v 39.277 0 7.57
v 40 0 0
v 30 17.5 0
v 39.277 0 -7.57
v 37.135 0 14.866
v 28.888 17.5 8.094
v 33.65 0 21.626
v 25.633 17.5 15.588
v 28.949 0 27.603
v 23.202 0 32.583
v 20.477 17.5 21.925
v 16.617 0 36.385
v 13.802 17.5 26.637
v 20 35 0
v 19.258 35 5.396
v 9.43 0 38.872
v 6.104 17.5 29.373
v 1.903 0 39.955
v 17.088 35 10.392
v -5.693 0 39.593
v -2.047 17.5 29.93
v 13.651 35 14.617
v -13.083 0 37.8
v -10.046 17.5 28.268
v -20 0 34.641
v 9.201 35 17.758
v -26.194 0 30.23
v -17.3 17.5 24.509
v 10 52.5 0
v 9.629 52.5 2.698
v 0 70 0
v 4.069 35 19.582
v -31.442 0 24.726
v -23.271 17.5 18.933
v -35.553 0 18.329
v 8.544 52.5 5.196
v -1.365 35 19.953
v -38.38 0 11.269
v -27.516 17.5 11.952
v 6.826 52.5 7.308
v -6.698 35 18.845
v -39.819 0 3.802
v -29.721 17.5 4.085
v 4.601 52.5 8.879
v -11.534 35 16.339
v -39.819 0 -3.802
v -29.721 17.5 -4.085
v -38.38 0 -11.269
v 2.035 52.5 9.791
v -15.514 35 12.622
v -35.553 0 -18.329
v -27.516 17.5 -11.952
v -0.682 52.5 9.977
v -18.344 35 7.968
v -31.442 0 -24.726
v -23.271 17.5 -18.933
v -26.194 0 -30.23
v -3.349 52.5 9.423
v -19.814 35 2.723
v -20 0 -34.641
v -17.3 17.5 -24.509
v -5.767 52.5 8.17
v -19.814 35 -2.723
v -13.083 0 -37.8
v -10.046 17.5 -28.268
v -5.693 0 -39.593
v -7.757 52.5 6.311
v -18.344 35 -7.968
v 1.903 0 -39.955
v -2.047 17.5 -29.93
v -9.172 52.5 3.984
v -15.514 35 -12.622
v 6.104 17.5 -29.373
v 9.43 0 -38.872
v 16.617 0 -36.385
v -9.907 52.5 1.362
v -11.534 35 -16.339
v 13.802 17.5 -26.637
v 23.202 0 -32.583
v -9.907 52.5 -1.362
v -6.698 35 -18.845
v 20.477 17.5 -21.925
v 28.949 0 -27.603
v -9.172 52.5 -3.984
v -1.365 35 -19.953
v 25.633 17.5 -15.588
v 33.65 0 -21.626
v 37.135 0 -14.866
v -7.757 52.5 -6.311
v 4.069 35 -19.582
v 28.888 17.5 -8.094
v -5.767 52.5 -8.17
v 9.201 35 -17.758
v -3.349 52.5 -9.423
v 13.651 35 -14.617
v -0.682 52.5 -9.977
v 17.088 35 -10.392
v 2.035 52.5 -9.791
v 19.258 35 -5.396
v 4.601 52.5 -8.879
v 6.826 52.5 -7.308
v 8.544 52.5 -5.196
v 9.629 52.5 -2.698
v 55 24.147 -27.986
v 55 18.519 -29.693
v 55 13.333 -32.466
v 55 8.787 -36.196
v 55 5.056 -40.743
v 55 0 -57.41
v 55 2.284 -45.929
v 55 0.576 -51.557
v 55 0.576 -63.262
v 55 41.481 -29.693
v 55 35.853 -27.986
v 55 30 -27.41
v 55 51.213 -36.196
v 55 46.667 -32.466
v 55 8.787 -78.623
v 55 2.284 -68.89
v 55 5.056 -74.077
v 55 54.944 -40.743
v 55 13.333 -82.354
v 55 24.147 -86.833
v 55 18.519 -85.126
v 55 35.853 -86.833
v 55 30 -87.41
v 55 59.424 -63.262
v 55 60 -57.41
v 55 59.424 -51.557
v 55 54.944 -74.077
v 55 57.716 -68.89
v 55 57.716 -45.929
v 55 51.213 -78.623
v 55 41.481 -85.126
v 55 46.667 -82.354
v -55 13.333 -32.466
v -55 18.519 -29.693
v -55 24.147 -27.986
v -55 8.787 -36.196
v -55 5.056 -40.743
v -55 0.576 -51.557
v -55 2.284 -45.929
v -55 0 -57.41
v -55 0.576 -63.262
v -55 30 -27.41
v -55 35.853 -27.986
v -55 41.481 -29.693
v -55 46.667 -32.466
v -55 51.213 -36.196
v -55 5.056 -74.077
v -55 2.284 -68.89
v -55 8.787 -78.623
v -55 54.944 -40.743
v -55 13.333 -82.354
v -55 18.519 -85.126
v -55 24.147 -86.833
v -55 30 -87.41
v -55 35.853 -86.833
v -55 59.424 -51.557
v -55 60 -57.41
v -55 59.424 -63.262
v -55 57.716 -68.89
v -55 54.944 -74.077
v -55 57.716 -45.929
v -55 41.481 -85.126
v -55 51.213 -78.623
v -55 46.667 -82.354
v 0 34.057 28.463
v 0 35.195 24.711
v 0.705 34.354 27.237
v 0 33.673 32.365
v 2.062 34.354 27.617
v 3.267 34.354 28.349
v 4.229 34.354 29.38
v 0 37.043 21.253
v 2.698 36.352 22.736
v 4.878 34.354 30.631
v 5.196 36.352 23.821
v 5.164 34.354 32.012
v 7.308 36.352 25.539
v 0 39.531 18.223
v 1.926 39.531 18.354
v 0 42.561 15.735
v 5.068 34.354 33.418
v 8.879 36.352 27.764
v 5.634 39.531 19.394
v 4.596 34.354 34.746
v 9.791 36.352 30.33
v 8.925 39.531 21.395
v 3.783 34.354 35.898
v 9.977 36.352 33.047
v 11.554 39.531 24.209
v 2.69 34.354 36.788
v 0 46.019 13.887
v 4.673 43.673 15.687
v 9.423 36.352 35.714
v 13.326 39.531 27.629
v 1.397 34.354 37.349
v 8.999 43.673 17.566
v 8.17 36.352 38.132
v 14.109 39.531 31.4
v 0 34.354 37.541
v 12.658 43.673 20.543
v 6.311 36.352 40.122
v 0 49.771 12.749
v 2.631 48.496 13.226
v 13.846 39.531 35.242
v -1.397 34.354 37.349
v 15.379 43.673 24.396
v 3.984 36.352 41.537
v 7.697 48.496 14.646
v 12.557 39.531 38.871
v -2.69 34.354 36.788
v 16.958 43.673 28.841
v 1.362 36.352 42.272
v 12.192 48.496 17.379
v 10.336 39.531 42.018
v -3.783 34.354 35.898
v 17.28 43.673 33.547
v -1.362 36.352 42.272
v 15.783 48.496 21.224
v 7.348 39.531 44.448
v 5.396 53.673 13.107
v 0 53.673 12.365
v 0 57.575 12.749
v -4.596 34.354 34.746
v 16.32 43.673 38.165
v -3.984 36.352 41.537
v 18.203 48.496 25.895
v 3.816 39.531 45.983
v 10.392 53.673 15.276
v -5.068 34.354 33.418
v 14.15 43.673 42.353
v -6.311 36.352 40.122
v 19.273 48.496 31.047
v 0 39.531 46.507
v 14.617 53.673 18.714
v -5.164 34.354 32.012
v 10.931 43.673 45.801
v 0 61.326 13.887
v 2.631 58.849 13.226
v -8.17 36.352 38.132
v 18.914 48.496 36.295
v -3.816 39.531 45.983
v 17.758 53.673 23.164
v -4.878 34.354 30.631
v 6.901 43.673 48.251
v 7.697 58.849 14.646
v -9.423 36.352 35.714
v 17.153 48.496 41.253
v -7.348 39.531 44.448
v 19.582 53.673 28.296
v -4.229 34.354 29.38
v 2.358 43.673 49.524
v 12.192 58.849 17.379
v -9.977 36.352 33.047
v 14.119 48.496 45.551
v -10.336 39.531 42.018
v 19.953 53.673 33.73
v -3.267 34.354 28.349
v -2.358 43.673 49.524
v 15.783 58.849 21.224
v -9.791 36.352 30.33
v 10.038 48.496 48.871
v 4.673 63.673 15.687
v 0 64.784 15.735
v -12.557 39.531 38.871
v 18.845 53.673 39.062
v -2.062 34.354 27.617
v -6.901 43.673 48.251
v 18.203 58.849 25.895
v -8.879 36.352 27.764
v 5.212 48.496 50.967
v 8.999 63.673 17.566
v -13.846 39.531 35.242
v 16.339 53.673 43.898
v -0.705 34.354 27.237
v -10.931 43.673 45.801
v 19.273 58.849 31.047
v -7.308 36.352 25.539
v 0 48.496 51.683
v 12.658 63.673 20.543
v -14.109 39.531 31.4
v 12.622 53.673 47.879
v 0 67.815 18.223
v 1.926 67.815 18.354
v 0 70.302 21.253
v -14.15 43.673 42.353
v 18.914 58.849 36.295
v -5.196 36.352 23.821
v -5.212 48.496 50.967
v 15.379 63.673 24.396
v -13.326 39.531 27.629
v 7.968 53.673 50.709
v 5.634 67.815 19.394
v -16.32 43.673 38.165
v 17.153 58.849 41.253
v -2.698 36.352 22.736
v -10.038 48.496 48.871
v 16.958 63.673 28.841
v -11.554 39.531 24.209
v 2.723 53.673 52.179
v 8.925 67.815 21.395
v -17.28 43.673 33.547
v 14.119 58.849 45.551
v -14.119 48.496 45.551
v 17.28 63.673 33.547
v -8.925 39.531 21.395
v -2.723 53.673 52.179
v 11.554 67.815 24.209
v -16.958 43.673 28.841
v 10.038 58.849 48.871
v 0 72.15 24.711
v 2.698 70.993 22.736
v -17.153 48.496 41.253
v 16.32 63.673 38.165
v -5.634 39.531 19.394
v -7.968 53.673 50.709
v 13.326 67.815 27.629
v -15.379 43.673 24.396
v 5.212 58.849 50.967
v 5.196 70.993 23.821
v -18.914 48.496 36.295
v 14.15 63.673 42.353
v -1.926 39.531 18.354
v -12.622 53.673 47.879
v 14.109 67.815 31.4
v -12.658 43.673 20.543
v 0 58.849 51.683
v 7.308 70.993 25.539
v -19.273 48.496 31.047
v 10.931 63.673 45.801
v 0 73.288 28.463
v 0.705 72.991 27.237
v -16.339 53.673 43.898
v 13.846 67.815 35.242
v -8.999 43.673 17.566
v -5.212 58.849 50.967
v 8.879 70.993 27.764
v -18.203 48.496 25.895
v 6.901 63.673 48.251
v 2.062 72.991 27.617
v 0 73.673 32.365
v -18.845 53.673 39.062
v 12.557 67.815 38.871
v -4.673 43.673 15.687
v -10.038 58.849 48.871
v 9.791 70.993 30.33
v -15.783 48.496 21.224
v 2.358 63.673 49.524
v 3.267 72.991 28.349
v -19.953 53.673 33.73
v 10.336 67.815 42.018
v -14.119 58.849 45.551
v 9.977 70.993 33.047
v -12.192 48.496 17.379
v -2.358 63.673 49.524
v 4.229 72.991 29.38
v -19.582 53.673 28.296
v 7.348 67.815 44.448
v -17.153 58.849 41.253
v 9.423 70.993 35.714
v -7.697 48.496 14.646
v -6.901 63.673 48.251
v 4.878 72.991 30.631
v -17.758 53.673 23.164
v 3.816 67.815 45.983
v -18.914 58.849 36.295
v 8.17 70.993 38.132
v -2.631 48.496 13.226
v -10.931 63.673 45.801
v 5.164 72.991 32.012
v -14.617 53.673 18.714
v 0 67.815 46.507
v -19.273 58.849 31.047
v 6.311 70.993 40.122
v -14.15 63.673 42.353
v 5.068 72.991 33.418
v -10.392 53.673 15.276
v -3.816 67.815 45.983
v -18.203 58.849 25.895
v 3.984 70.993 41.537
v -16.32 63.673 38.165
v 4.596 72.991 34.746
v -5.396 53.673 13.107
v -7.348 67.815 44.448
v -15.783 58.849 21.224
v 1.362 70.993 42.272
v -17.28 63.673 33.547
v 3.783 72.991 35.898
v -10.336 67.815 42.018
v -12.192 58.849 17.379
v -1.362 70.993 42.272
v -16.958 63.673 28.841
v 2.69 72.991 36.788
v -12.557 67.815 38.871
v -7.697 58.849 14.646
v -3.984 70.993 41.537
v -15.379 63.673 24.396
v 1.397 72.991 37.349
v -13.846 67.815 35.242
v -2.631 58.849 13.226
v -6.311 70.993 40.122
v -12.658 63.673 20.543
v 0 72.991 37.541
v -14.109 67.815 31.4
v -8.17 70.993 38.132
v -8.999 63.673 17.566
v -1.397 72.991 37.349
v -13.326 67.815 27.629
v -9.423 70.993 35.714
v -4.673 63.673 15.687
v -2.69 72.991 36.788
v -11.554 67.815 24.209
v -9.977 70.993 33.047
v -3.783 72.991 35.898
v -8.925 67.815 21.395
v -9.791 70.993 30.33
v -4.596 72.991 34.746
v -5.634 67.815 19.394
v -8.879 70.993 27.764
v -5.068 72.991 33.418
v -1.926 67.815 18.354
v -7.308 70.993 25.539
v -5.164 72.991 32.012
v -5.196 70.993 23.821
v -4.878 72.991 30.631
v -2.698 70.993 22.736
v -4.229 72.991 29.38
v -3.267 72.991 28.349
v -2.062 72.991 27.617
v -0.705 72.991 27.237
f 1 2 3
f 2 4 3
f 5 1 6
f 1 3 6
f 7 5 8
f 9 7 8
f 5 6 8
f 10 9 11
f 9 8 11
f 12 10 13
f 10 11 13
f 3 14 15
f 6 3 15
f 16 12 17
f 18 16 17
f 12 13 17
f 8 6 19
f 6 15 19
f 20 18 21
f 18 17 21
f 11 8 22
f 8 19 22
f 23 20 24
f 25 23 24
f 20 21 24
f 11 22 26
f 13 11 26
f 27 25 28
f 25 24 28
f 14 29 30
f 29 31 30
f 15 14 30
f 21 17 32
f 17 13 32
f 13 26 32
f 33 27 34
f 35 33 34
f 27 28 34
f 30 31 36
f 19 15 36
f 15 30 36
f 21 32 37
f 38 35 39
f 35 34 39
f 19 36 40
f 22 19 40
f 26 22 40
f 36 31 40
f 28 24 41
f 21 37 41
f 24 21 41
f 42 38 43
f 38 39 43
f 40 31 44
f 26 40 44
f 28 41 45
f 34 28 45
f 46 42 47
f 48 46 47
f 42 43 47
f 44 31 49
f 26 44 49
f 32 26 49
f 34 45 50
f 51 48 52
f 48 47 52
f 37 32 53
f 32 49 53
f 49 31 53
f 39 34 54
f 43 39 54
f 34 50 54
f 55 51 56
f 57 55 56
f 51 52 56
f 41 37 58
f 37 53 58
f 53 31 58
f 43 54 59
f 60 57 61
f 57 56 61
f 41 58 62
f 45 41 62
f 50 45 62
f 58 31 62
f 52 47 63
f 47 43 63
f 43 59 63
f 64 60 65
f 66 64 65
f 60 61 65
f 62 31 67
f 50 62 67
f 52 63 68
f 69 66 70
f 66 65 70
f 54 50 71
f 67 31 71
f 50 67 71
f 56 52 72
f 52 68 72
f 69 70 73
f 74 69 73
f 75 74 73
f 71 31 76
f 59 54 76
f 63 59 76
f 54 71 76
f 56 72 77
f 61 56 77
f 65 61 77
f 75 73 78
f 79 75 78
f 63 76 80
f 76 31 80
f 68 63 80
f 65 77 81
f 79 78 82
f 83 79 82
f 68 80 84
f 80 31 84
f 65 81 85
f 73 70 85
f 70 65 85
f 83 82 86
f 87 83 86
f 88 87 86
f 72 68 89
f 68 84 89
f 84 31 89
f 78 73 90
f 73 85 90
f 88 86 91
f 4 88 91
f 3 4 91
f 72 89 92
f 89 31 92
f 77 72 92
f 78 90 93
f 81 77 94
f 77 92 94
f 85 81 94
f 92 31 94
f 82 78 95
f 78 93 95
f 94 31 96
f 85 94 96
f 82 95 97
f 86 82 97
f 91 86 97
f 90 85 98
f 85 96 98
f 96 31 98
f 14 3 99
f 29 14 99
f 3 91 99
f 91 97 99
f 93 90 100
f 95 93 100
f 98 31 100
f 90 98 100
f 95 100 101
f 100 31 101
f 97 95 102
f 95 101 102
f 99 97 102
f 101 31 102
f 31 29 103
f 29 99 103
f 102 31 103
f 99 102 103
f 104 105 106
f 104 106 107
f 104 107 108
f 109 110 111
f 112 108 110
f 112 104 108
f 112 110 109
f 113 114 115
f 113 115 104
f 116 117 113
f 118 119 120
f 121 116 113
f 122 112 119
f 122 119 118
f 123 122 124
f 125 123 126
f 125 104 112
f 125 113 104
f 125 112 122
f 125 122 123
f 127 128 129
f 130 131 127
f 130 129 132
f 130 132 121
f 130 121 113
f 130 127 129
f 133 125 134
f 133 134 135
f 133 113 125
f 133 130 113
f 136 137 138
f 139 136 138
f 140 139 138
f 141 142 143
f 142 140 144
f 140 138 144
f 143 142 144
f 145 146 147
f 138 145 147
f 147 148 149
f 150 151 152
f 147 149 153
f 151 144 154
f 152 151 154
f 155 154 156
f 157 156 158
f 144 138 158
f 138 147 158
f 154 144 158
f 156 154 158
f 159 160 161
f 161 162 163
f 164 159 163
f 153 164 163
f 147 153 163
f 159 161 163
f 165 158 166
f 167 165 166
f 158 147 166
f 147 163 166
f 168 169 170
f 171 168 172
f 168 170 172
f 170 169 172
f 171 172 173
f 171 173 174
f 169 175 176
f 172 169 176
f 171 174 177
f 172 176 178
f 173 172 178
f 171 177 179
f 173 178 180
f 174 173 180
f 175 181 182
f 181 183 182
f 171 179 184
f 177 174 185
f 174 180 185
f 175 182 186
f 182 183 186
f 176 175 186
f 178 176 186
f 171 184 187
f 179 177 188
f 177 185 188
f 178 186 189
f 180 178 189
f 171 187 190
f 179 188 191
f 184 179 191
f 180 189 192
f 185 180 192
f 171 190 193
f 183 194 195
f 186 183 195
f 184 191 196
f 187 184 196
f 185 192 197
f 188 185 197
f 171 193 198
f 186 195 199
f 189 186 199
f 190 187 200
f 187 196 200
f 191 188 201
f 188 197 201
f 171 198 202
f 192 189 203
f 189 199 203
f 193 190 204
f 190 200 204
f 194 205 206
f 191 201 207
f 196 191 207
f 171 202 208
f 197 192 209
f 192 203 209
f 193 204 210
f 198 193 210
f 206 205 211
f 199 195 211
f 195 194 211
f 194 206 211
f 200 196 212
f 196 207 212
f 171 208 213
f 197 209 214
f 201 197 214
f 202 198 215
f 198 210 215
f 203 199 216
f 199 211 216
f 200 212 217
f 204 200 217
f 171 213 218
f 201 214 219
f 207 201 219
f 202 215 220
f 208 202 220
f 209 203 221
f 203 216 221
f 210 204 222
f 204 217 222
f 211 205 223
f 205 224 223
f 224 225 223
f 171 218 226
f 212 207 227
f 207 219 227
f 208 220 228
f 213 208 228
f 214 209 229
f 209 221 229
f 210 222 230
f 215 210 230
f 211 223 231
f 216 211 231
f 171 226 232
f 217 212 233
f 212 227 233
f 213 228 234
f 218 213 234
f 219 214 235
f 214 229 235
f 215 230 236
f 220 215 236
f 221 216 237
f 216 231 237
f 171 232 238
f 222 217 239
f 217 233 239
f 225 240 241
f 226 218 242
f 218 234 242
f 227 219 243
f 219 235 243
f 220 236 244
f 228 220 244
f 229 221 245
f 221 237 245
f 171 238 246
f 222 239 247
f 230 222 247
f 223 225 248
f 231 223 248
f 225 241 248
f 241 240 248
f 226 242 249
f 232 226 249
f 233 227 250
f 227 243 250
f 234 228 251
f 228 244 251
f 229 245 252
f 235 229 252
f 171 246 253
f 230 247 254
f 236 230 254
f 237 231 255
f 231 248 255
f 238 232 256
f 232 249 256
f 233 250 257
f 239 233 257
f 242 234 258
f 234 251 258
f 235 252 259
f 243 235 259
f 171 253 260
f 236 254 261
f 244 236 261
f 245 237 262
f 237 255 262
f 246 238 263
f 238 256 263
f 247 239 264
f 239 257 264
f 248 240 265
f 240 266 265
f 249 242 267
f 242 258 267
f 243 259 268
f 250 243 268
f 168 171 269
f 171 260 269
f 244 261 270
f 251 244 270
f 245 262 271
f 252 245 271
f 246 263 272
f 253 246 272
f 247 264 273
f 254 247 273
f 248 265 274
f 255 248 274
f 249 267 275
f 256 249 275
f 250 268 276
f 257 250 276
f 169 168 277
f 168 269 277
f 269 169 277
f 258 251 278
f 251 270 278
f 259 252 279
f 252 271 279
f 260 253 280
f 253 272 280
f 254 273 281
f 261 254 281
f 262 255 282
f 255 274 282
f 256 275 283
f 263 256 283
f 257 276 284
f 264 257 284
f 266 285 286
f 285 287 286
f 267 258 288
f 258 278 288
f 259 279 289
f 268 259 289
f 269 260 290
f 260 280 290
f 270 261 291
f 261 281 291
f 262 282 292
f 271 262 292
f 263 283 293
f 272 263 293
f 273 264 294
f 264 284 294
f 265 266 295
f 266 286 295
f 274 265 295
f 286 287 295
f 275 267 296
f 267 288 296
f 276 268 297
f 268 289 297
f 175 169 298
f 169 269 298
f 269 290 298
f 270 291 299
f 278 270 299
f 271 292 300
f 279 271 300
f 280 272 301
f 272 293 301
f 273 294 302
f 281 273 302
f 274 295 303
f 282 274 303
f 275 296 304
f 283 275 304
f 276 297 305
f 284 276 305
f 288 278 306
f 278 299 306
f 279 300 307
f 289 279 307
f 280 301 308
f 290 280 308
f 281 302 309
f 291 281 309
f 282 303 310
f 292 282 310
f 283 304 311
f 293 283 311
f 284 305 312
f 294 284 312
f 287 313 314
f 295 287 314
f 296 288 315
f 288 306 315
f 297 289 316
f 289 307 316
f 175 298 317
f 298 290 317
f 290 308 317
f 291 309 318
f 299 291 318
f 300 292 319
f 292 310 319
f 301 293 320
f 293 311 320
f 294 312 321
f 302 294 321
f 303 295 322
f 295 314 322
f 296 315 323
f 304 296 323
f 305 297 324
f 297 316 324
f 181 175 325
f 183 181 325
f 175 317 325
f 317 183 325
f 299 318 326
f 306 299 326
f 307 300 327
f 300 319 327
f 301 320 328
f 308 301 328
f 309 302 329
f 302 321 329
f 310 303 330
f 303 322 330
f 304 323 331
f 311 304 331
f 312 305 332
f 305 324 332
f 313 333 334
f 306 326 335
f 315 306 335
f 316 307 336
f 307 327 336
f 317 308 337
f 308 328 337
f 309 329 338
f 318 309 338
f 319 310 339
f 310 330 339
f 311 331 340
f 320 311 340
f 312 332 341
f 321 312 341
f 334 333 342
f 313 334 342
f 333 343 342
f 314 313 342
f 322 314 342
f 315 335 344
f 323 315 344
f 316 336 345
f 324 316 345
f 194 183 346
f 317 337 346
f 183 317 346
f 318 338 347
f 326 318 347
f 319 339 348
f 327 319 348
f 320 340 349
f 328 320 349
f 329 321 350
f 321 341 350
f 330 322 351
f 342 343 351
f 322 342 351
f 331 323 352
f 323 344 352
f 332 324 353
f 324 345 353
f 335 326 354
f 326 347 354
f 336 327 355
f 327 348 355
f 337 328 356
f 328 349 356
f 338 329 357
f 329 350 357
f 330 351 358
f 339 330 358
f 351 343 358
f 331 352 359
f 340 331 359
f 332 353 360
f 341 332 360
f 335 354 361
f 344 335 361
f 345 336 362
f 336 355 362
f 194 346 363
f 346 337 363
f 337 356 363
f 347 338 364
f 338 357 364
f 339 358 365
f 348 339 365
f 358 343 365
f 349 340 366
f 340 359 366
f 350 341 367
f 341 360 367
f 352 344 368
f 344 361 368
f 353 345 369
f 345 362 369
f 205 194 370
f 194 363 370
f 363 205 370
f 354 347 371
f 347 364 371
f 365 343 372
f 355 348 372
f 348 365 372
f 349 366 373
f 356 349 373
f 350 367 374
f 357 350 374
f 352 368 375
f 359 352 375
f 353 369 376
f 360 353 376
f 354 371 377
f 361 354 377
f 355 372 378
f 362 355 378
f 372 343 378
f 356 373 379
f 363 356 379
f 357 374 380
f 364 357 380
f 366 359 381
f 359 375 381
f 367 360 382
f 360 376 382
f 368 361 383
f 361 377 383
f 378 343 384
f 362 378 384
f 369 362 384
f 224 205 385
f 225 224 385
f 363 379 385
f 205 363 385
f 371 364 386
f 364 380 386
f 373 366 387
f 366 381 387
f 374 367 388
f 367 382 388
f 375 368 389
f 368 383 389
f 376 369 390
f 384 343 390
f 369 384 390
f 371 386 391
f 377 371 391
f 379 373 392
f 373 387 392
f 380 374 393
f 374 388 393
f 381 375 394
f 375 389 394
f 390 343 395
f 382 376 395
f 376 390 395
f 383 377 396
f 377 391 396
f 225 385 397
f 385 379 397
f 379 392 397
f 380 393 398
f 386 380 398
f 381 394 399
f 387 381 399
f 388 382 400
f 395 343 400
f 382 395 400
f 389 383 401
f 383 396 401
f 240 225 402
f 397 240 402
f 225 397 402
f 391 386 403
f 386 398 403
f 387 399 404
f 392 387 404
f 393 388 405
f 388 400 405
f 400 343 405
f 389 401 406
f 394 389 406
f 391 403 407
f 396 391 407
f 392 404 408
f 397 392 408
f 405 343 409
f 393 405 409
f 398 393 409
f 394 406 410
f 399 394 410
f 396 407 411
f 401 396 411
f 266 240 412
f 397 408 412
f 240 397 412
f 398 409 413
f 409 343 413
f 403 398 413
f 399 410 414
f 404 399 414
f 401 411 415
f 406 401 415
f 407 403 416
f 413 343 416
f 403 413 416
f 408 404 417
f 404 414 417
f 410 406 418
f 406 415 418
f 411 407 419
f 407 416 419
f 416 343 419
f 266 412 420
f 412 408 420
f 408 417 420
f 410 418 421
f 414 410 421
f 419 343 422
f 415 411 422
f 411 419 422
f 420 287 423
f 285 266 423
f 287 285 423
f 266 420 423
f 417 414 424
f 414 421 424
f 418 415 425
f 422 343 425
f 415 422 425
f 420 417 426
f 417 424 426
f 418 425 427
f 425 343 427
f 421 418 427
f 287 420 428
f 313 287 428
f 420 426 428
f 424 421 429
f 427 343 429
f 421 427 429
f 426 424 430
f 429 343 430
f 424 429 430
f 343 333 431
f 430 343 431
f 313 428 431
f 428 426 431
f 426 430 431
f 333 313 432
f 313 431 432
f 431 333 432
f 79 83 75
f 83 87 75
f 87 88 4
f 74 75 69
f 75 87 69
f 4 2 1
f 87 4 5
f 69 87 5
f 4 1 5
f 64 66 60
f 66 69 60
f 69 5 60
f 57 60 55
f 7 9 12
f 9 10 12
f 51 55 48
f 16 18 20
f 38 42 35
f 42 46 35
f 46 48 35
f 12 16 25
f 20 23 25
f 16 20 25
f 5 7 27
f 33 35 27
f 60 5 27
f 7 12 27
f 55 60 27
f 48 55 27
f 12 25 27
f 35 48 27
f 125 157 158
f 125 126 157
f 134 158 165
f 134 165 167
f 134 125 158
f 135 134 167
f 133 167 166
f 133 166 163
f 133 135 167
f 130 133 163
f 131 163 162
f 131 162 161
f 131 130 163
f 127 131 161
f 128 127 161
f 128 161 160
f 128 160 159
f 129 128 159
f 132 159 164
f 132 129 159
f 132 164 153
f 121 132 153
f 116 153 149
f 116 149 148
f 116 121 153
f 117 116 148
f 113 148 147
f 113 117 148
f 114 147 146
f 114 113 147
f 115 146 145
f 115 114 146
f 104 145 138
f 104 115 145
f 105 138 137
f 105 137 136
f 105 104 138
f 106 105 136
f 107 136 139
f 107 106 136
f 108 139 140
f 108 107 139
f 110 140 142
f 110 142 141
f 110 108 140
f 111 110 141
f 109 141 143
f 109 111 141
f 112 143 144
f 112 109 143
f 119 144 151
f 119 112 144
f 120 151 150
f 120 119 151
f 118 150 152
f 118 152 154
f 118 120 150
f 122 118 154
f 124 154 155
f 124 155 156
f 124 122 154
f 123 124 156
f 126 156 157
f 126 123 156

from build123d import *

# Parameters (mm, degrees)
SKETCH2_R      = 30
EXTRUDE1_DEPTH = 55


with BuildPart() as part:
    # Sketch1 → Revolve1 (revolve)
    with BuildSketch(Plane.XY):
        Polygon((0, 0), (40, 0), (0, 70), align=None)
    revolve(axis=Axis((0, 70, 0), (0, -1, 0)))


with BuildPart() as body_2:
    # Sketch2 → Extrude1 (new body, symmetric)
    with BuildSketch(Plane(origin=(0, 0, 0), x_dir=(0, 0, -1), z_dir=(1, 0, 0))):
        with Locations((57.409676064, 30)):
            Circle(SKETCH2_R)
    extrude(amount=EXTRUDE1_DEPTH, both=True)


with BuildPart() as body_3:
    # Sketch3 → Revolve2 (revolve)
    with BuildSketch(Plane(origin=(0, 0, 0), x_dir=(0, 0, -1), z_dir=(1, 0, 0))):
        with BuildLine():
            Line((-32.364862842, 73.672778767), (-32.364862842, 33.672778767))
            ThreePointArc((-32.364862842, 33.672778767), (-12.364862842, 53.672778767), (-32.364862842, 73.672778767))
        make_face()
    revolve(axis=Axis((0, 73.672778767, 32.364862842), (0, -1, 0)))


solid = Compound([part.part, body_2.part, body_3.part])
